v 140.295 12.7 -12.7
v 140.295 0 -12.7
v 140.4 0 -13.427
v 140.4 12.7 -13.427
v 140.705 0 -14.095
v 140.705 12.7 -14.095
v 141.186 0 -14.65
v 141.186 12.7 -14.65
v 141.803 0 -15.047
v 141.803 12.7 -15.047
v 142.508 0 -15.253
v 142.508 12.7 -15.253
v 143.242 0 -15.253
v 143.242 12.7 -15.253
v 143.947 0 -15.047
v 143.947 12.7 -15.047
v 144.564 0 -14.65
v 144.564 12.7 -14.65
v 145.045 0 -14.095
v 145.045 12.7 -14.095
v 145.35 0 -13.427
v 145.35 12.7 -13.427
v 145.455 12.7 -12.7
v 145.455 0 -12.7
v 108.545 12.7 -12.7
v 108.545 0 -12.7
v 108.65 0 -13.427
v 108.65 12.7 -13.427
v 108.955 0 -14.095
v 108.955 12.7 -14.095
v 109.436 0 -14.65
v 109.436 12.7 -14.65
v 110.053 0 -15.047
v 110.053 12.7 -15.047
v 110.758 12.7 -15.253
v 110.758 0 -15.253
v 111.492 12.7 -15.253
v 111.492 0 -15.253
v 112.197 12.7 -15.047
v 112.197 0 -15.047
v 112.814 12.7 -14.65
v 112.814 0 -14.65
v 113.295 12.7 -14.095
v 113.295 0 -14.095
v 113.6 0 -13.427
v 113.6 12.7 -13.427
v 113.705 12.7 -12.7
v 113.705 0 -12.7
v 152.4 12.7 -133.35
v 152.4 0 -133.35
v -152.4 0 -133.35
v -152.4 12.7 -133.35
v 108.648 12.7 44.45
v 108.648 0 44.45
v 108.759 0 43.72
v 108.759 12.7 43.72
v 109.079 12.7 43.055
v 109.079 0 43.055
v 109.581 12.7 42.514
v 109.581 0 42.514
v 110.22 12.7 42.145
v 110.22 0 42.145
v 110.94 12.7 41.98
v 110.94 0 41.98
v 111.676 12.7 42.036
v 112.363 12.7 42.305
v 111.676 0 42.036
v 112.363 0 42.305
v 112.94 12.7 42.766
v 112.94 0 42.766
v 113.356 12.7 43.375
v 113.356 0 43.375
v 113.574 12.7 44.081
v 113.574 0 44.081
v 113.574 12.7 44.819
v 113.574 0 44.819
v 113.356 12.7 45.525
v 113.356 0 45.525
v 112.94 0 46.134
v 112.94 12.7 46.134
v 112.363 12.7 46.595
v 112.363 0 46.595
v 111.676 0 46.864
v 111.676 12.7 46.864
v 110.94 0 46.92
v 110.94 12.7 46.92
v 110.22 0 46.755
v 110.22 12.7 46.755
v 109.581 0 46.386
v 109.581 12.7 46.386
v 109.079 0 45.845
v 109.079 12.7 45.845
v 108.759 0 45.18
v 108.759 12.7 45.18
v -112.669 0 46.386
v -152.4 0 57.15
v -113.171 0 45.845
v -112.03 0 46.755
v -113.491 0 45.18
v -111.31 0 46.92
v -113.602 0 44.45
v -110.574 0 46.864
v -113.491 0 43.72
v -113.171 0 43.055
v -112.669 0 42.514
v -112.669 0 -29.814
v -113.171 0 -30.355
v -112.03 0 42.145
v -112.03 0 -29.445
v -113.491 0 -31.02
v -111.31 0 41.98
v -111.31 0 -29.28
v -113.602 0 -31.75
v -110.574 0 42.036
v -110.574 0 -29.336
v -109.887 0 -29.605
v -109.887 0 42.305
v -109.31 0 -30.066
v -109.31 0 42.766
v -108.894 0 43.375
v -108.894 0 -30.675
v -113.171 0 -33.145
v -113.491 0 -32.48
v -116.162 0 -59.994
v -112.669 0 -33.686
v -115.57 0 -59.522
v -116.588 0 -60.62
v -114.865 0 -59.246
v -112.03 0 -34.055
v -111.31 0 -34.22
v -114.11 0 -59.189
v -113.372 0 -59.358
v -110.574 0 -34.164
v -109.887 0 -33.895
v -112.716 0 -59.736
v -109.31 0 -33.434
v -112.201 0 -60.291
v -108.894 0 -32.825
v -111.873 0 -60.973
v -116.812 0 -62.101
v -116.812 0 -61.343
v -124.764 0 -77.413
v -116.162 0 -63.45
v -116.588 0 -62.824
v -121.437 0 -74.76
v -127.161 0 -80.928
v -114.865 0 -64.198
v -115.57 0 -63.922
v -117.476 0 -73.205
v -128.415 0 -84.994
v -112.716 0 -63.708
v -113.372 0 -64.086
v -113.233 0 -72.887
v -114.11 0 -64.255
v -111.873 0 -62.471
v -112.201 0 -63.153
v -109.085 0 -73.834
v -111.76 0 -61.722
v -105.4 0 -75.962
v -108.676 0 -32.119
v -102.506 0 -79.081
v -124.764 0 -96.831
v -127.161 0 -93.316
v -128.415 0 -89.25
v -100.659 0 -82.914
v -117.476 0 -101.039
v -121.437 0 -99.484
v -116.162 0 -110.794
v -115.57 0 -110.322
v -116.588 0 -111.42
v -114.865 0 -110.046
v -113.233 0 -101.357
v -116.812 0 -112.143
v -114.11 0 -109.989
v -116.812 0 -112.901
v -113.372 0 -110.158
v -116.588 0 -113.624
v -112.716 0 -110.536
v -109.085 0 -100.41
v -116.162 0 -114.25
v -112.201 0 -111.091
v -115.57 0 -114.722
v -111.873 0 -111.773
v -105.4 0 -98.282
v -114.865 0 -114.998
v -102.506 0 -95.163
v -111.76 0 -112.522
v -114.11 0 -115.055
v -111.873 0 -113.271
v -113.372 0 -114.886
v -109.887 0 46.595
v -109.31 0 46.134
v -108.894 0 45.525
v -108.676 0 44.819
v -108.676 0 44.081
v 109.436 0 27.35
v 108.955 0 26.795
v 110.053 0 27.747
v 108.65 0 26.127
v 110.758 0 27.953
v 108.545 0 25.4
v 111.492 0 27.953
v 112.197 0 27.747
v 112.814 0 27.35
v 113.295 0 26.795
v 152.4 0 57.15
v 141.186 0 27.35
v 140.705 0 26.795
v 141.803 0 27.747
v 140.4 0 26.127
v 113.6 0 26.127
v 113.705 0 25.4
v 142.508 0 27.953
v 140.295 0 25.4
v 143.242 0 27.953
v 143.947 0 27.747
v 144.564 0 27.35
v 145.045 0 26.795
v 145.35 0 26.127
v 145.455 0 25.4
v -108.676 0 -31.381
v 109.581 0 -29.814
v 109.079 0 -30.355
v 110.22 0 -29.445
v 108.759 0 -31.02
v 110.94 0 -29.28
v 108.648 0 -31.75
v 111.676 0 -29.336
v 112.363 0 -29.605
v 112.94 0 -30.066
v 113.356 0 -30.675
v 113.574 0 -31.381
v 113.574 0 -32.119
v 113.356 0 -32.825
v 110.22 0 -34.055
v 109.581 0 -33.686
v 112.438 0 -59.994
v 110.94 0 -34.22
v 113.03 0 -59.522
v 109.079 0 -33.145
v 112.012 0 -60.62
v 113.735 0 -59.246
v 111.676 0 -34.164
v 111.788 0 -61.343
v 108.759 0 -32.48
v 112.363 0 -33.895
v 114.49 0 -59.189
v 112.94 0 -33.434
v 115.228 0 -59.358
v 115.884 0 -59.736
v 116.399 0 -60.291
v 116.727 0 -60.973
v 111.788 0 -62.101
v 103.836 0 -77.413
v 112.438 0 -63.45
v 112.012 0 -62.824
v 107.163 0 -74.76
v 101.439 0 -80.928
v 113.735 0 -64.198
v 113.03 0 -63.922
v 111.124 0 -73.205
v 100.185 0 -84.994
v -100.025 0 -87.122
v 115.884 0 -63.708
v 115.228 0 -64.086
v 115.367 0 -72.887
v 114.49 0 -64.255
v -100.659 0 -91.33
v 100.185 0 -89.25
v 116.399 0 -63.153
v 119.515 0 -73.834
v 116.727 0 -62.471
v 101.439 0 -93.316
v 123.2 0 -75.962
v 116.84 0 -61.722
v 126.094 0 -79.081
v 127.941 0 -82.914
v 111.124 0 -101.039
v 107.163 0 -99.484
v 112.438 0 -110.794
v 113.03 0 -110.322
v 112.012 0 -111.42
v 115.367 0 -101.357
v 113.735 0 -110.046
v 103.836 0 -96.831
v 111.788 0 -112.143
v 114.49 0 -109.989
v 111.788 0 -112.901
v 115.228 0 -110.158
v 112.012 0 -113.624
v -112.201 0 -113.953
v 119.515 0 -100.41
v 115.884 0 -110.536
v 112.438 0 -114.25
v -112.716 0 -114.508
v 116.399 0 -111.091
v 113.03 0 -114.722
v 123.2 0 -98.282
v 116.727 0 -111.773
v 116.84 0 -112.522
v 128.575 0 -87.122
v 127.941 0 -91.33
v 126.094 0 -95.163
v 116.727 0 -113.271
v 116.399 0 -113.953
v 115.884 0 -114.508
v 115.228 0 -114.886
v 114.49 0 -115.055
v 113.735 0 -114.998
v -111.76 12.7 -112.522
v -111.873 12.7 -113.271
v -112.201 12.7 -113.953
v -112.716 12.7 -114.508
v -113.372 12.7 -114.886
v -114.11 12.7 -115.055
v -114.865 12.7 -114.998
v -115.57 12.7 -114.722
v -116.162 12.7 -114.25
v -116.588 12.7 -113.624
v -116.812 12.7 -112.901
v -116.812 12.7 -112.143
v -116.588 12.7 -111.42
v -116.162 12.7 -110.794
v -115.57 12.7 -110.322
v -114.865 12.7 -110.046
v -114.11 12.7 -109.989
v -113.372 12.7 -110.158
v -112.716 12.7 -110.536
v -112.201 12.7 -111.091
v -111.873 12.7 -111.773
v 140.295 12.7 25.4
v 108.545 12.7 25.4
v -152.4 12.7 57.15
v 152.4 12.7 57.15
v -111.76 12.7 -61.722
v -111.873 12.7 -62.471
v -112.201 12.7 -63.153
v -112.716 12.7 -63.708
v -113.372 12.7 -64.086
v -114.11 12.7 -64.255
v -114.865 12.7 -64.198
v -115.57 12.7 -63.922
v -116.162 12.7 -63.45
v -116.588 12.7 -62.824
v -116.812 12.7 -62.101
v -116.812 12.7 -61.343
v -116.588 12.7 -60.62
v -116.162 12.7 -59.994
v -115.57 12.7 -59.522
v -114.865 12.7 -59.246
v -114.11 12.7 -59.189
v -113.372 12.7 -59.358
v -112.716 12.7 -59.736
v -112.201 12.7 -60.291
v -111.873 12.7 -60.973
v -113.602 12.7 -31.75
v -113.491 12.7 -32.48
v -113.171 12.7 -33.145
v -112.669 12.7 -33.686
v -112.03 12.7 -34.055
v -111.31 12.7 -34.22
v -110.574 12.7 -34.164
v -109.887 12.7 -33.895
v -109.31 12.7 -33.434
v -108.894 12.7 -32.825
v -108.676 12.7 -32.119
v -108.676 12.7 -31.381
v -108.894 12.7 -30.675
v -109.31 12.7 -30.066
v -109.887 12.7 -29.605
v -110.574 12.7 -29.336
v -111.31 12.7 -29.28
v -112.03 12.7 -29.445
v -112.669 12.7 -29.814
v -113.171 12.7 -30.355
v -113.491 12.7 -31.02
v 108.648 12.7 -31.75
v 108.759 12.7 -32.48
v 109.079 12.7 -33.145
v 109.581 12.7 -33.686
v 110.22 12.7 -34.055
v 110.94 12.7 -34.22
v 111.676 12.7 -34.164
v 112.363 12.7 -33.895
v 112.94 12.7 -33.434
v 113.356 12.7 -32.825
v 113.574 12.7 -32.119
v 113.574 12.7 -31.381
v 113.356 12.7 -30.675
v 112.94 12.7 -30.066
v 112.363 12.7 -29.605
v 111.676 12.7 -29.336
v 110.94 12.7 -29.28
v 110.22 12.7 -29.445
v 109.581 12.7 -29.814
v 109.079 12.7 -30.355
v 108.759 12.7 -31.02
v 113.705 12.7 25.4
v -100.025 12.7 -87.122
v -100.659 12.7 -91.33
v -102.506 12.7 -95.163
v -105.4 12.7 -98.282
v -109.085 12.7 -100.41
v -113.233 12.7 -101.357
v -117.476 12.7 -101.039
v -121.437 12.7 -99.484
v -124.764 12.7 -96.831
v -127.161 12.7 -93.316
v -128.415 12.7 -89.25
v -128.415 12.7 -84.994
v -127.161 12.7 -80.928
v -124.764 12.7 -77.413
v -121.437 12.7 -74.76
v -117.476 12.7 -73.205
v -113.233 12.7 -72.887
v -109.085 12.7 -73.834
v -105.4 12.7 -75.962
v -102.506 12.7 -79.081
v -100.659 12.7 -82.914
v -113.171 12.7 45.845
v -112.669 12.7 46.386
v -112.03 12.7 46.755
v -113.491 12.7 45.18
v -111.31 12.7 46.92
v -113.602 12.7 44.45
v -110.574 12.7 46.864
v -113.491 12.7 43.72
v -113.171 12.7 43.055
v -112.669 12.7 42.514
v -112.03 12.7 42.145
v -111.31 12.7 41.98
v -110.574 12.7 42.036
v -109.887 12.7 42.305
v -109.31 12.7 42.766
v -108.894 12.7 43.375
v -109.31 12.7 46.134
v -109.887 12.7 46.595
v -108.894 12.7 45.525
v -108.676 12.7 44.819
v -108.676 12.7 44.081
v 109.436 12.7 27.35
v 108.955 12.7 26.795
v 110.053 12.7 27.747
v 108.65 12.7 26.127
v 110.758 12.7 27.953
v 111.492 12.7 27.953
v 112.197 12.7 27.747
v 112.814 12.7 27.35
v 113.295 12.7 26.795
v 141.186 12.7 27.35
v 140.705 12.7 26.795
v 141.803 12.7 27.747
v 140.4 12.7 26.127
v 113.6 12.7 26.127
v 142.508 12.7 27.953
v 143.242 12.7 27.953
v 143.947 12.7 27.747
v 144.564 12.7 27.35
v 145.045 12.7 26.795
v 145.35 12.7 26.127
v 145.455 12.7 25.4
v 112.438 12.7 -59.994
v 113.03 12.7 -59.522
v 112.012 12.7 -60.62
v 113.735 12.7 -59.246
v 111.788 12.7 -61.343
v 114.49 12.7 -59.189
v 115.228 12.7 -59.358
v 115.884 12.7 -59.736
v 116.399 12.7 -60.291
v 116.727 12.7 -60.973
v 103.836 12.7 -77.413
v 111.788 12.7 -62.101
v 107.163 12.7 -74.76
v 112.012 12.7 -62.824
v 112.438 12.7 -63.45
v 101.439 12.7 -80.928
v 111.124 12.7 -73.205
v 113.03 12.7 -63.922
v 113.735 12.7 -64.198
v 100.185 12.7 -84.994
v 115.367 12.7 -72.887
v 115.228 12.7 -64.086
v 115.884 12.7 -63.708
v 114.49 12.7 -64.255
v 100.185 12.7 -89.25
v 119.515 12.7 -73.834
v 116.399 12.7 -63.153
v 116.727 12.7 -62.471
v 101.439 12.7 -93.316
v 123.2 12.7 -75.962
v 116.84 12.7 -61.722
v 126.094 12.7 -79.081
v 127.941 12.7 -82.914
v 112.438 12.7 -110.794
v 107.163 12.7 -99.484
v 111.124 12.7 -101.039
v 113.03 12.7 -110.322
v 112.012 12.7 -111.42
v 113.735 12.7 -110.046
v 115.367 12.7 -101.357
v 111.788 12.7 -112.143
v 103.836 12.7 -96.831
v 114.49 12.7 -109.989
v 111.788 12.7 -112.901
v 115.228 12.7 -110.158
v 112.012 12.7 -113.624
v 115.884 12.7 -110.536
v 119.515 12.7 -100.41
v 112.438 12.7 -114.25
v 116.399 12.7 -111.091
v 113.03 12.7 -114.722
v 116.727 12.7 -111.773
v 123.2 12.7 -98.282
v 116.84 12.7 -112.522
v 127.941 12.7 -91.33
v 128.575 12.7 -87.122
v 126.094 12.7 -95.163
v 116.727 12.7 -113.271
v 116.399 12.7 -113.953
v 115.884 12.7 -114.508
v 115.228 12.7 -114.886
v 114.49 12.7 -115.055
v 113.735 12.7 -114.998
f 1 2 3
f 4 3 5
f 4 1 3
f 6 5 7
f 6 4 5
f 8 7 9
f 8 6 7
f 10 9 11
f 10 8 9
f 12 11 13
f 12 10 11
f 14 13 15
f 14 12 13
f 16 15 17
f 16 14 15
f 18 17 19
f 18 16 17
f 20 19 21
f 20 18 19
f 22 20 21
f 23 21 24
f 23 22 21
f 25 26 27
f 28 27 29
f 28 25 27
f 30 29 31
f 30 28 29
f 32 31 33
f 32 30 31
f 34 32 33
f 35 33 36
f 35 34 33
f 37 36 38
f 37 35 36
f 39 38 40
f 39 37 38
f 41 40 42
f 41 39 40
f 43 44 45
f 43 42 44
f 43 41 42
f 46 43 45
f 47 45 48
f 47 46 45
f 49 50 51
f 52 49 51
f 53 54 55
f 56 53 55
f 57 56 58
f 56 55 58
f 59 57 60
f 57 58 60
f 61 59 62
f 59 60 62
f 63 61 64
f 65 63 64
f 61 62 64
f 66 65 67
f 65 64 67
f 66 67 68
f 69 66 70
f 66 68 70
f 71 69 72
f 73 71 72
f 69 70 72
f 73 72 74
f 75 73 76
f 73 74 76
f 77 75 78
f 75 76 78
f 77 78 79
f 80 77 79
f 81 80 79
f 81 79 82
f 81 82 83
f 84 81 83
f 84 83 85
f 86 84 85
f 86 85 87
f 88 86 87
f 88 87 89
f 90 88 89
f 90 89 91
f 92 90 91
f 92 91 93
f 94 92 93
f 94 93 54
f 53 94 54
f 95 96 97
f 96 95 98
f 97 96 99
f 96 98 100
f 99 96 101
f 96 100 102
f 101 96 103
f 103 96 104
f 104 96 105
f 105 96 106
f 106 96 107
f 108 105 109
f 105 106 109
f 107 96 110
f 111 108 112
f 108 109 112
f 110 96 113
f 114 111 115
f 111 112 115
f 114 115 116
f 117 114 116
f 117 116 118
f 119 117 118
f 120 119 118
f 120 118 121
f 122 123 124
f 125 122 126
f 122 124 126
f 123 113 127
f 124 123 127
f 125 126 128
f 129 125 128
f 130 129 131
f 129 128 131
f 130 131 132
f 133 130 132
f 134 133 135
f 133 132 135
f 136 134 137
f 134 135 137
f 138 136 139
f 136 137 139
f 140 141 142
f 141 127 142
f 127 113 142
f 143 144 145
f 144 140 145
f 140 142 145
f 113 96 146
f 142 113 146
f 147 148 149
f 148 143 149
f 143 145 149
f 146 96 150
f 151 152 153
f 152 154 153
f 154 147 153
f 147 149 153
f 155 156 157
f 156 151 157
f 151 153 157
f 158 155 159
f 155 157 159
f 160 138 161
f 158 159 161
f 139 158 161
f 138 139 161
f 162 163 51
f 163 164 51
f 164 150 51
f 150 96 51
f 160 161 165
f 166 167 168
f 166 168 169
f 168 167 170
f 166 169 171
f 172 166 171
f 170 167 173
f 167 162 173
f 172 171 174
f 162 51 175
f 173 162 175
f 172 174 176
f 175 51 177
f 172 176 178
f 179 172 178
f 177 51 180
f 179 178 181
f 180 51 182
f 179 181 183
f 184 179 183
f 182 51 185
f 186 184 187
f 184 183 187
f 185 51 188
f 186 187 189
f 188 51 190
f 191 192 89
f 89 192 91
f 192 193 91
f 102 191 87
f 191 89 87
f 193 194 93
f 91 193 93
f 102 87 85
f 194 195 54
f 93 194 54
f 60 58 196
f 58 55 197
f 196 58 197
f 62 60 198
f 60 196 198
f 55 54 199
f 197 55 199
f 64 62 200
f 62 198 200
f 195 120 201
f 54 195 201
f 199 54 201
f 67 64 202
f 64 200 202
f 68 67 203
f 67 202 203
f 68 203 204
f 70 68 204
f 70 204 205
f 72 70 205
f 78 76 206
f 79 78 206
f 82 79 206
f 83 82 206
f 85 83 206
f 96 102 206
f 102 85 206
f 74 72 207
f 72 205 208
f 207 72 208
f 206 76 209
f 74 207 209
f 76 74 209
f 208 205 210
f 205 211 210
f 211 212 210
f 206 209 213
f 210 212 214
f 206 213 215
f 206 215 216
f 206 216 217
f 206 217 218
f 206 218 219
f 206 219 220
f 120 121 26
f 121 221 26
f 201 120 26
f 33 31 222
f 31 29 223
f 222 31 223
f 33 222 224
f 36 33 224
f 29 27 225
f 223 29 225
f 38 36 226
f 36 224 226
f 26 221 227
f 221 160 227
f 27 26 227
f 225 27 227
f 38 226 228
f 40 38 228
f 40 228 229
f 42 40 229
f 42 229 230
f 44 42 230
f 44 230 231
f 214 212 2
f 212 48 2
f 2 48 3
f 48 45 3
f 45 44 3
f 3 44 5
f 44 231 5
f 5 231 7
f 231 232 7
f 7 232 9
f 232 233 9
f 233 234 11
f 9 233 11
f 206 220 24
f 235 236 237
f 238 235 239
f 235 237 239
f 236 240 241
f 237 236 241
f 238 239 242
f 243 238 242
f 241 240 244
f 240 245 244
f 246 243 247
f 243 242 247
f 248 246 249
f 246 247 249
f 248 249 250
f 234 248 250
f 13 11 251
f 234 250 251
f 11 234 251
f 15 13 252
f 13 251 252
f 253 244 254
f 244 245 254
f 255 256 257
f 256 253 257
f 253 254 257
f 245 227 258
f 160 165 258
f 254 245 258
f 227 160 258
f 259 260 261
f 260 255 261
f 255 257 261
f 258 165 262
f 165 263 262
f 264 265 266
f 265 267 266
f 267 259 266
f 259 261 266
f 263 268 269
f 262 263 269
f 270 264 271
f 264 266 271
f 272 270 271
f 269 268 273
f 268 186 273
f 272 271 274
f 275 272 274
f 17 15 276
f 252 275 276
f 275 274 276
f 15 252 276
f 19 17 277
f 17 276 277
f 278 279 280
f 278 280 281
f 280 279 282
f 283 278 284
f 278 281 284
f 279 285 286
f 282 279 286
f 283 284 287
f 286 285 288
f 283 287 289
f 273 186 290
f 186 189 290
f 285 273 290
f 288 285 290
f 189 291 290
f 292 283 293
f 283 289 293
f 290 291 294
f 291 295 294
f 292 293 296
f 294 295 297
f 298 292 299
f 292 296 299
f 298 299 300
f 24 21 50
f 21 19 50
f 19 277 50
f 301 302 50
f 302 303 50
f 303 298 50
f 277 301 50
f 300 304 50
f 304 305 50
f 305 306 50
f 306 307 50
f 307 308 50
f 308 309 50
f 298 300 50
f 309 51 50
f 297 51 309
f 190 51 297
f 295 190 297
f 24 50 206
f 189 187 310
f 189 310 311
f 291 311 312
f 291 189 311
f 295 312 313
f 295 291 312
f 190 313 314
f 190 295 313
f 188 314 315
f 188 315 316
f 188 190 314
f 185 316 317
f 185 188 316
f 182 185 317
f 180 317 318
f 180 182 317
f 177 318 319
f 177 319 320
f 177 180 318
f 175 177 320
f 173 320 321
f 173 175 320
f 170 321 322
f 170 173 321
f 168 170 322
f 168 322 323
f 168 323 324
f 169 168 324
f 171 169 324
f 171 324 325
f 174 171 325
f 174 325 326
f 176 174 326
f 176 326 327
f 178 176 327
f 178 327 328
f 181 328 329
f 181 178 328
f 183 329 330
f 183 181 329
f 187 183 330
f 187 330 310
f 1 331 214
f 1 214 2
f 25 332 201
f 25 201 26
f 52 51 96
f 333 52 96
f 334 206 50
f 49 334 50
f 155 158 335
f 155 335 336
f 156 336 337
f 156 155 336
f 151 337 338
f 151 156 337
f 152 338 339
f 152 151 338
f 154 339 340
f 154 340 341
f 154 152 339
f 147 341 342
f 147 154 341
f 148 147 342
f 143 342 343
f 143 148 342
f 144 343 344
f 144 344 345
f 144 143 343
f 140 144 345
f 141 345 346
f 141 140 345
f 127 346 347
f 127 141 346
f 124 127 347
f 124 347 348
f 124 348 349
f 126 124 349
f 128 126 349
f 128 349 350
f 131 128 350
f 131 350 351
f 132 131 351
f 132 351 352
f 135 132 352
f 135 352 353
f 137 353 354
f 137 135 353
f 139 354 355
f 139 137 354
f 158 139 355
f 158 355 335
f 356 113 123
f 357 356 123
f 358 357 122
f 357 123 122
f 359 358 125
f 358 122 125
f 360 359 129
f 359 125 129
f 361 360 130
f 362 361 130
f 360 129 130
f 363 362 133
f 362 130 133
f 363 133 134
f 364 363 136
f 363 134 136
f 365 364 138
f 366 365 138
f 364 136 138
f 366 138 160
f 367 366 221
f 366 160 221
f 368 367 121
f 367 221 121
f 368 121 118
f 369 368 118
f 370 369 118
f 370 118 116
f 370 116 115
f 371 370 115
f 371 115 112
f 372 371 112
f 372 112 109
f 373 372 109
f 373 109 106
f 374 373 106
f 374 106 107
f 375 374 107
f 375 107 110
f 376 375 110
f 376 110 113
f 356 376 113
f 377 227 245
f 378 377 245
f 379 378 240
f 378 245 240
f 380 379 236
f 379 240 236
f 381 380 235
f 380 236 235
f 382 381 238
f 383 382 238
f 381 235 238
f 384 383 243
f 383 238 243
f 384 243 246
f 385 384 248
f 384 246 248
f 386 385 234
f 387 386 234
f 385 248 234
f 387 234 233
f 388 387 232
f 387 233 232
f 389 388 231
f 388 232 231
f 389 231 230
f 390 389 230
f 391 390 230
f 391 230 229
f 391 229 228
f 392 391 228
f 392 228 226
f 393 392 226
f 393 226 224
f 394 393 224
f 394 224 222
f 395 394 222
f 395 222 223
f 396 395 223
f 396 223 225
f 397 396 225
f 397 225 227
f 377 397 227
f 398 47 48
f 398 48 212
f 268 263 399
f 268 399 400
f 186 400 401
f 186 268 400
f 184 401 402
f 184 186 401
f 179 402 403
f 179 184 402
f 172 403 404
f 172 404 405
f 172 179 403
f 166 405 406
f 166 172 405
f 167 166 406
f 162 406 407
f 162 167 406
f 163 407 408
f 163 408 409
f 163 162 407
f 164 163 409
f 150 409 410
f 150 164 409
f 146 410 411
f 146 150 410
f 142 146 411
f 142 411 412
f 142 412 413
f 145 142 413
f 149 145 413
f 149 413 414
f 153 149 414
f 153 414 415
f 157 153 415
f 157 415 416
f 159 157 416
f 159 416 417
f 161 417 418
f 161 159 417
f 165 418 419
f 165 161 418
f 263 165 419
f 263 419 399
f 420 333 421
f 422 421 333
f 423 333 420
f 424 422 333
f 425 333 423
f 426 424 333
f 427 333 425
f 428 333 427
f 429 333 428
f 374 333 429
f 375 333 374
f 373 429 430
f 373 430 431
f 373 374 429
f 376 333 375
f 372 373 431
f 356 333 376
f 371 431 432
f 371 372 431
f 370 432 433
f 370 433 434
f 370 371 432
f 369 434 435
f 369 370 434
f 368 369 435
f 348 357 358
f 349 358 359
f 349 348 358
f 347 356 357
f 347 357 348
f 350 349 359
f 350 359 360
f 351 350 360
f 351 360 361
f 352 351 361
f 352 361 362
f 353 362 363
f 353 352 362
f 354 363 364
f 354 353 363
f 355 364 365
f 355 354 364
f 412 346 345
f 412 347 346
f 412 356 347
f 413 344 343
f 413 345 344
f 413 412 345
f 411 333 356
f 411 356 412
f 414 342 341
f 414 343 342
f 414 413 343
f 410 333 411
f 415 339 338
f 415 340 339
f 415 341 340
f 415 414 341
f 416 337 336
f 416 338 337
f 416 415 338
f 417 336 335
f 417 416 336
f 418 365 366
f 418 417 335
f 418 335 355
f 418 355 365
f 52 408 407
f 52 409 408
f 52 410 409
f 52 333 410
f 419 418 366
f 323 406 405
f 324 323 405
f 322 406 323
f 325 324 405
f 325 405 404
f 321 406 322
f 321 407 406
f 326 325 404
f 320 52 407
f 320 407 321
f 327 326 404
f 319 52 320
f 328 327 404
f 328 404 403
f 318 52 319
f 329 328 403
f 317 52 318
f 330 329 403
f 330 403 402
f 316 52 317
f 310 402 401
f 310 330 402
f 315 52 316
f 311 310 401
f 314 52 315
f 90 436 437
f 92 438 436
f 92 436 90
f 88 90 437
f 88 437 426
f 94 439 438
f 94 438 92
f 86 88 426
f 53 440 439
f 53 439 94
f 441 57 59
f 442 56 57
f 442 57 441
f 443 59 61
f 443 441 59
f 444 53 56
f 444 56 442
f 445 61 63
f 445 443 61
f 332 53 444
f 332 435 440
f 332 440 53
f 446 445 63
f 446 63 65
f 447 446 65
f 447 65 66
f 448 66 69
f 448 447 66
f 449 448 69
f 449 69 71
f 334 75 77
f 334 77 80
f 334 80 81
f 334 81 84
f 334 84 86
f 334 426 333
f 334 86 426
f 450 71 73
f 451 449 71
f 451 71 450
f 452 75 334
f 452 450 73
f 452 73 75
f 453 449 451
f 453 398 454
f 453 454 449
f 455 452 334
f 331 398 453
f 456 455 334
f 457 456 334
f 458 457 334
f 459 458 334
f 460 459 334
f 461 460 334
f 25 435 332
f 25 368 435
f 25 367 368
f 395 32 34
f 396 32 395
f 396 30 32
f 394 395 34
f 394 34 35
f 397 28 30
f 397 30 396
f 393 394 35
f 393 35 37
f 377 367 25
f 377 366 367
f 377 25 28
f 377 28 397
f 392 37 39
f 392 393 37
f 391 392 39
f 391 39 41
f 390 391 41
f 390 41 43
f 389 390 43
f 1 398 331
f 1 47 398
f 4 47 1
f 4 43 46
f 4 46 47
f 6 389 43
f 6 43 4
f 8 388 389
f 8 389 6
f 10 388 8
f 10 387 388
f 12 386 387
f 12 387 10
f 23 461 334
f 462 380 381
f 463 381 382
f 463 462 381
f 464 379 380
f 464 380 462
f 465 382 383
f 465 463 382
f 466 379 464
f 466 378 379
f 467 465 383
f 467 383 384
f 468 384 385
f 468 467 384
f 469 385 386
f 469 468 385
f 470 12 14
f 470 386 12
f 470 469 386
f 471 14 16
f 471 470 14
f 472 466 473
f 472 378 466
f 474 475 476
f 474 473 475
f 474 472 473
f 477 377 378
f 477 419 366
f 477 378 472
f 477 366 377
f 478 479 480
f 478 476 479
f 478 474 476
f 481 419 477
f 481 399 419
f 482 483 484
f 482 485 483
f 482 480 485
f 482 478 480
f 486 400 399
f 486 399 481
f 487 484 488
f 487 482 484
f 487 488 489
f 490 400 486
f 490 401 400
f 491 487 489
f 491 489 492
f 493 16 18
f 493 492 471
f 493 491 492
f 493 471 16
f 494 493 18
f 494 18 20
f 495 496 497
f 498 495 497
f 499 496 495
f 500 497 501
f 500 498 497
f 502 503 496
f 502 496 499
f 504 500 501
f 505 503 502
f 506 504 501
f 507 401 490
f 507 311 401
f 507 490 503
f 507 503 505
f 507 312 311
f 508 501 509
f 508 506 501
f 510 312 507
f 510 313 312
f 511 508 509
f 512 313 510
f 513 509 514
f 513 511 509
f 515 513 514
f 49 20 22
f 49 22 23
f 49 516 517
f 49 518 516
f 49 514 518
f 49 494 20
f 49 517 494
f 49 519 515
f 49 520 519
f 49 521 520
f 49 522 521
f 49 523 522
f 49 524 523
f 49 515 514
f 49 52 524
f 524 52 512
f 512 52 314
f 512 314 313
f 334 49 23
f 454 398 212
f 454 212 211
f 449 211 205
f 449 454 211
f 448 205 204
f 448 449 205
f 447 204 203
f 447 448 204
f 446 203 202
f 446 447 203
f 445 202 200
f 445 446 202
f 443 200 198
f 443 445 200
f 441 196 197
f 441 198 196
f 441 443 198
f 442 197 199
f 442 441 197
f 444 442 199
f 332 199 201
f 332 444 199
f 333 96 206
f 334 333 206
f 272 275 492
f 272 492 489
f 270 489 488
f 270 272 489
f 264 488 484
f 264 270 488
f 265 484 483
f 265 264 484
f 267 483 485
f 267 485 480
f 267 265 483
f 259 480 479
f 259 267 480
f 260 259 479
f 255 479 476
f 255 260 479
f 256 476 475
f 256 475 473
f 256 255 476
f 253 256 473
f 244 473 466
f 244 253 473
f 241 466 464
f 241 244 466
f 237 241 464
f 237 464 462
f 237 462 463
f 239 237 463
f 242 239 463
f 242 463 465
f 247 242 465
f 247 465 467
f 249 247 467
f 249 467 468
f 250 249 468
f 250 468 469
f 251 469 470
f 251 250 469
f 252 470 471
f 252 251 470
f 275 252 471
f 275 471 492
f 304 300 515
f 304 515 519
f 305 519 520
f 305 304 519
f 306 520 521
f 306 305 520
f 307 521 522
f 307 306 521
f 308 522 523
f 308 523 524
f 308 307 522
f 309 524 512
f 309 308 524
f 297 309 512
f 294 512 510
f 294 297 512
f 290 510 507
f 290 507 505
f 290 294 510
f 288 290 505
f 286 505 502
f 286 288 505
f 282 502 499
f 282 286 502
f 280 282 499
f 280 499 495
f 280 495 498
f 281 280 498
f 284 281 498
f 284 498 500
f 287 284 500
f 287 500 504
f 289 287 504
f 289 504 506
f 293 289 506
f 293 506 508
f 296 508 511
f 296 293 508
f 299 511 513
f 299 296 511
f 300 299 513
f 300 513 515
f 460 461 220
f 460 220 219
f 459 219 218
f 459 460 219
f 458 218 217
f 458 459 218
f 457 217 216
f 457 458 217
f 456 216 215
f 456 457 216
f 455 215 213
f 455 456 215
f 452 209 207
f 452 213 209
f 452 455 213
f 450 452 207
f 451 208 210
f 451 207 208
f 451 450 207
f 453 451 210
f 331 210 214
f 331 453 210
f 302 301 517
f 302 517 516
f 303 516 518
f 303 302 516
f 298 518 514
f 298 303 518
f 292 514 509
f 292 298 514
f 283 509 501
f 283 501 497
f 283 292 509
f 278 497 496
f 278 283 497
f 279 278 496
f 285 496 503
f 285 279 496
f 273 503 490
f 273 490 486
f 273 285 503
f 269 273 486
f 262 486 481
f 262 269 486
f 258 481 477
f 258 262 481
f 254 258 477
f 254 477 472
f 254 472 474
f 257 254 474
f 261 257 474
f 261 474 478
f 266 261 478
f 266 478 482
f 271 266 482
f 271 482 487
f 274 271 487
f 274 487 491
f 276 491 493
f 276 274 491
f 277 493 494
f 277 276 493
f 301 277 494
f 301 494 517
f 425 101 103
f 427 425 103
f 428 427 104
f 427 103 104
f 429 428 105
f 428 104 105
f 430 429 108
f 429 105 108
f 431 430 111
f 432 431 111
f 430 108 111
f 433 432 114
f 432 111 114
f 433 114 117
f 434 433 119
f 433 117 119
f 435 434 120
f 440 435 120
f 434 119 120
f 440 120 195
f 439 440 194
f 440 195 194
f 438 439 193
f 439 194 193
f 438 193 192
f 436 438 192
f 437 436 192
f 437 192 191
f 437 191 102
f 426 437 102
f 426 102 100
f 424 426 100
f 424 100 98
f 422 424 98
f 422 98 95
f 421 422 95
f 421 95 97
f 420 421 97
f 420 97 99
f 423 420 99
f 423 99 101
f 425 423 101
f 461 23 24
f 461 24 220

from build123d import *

# Parameters (mm, degrees)
SKETCH1_R           = 2.54
SKETCH1_R_2         = 14.2748
BOSS_EXTRUDE1_DEPTH = 12.7
CUT_EXTRUDE2_DEPTH  = 13.7
SKETCH3_R           = 2.4765
CUT_EXTRUDE3_DEPTH  = 13.7


with BuildPart() as part:
    # Sketch1 → Boss-Extrude1 (new body)
    with BuildSketch(Plane(origin=(0, 0, 0), x_dir=(1, 0, 0), z_dir=(0, 1, 0))):
        Polygon((152.4, 133.35), (-152.4, 133.35), (-152.4, -57.15), (-88.9, -57.15), (88.9, -57.15), (152.4, -57.15), align=None)
        with Locations((-114.3, 61.722)):
            Circle(SKETCH1_R, mode=Mode.SUBTRACT)
        with Locations((-114.3, 87.122)):
            Circle(SKETCH1_R_2, mode=Mode.SUBTRACT)
        with Locations((-114.3, 112.522)):
            Circle(SKETCH1_R, mode=Mode.SUBTRACT)
        with Locations((114.3, 61.722)):
            Circle(SKETCH1_R, mode=Mode.SUBTRACT)
        with Locations((114.3, 87.122)):
            Circle(SKETCH1_R_2, mode=Mode.SUBTRACT)
        with Locations((114.3, 112.522)):
            Circle(SKETCH1_R, mode=Mode.SUBTRACT)
    extrude(amount=BOSS_EXTRUDE1_DEPTH)

    # Sketch2 → Cut-Extrude2 (cut, through all)
    with BuildSketch(Plane(origin=(0, 12.7, 0), x_dir=(1, 0, 0), z_dir=(0, 1, 0))):
        with BuildLine():
            Line((108.5453125, -25.4), (108.5453125, 12.7))
            ThreePointArc((108.5453125, 12.7), (111.125, 15.2796875), (113.7046875, 12.7))
            Line((113.7046875, 12.7), (113.7046875, -25.4))
            ThreePointArc((113.7046875, -25.4), (111.125, -27.9796875), (108.5453125, -25.4))
        make_face()
        with BuildLine():
            Line((140.2953125, -25.4), (140.2953125, 12.7))
            ThreePointArc((140.2953125, 12.7), (142.875, 15.2796875), (145.4546875, 12.7))
            Line((145.4546875, 12.7), (145.4546875, -25.4))
            ThreePointArc((145.4546875, -25.4), (142.875, -27.9796875), (140.2953125, -25.4))
        make_face()
    extrude(amount=-CUT_EXTRUDE2_DEPTH, mode=Mode.SUBTRACT)

    # Sketch3 → Cut-Extrude3 (cut, through all)
    with BuildSketch(Plane(origin=(0, 0, 0), x_dir=(-1, 0, 0), z_dir=(0, -1, 0))):
        with Locations((-111.125, -44.45)):
            Circle(SKETCH3_R)
        with Locations((-111.125, 31.75)):
            Circle(SKETCH3_R)
        with Locations((111.125, 31.75)):
            Circle(SKETCH3_R)
        with Locations((111.125, -44.45)):
            Circle(SKETCH3_R)
    extrude(amount=-CUT_EXTRUDE3_DEPTH, mode=Mode.SUBTRACT)


solid = part.part
